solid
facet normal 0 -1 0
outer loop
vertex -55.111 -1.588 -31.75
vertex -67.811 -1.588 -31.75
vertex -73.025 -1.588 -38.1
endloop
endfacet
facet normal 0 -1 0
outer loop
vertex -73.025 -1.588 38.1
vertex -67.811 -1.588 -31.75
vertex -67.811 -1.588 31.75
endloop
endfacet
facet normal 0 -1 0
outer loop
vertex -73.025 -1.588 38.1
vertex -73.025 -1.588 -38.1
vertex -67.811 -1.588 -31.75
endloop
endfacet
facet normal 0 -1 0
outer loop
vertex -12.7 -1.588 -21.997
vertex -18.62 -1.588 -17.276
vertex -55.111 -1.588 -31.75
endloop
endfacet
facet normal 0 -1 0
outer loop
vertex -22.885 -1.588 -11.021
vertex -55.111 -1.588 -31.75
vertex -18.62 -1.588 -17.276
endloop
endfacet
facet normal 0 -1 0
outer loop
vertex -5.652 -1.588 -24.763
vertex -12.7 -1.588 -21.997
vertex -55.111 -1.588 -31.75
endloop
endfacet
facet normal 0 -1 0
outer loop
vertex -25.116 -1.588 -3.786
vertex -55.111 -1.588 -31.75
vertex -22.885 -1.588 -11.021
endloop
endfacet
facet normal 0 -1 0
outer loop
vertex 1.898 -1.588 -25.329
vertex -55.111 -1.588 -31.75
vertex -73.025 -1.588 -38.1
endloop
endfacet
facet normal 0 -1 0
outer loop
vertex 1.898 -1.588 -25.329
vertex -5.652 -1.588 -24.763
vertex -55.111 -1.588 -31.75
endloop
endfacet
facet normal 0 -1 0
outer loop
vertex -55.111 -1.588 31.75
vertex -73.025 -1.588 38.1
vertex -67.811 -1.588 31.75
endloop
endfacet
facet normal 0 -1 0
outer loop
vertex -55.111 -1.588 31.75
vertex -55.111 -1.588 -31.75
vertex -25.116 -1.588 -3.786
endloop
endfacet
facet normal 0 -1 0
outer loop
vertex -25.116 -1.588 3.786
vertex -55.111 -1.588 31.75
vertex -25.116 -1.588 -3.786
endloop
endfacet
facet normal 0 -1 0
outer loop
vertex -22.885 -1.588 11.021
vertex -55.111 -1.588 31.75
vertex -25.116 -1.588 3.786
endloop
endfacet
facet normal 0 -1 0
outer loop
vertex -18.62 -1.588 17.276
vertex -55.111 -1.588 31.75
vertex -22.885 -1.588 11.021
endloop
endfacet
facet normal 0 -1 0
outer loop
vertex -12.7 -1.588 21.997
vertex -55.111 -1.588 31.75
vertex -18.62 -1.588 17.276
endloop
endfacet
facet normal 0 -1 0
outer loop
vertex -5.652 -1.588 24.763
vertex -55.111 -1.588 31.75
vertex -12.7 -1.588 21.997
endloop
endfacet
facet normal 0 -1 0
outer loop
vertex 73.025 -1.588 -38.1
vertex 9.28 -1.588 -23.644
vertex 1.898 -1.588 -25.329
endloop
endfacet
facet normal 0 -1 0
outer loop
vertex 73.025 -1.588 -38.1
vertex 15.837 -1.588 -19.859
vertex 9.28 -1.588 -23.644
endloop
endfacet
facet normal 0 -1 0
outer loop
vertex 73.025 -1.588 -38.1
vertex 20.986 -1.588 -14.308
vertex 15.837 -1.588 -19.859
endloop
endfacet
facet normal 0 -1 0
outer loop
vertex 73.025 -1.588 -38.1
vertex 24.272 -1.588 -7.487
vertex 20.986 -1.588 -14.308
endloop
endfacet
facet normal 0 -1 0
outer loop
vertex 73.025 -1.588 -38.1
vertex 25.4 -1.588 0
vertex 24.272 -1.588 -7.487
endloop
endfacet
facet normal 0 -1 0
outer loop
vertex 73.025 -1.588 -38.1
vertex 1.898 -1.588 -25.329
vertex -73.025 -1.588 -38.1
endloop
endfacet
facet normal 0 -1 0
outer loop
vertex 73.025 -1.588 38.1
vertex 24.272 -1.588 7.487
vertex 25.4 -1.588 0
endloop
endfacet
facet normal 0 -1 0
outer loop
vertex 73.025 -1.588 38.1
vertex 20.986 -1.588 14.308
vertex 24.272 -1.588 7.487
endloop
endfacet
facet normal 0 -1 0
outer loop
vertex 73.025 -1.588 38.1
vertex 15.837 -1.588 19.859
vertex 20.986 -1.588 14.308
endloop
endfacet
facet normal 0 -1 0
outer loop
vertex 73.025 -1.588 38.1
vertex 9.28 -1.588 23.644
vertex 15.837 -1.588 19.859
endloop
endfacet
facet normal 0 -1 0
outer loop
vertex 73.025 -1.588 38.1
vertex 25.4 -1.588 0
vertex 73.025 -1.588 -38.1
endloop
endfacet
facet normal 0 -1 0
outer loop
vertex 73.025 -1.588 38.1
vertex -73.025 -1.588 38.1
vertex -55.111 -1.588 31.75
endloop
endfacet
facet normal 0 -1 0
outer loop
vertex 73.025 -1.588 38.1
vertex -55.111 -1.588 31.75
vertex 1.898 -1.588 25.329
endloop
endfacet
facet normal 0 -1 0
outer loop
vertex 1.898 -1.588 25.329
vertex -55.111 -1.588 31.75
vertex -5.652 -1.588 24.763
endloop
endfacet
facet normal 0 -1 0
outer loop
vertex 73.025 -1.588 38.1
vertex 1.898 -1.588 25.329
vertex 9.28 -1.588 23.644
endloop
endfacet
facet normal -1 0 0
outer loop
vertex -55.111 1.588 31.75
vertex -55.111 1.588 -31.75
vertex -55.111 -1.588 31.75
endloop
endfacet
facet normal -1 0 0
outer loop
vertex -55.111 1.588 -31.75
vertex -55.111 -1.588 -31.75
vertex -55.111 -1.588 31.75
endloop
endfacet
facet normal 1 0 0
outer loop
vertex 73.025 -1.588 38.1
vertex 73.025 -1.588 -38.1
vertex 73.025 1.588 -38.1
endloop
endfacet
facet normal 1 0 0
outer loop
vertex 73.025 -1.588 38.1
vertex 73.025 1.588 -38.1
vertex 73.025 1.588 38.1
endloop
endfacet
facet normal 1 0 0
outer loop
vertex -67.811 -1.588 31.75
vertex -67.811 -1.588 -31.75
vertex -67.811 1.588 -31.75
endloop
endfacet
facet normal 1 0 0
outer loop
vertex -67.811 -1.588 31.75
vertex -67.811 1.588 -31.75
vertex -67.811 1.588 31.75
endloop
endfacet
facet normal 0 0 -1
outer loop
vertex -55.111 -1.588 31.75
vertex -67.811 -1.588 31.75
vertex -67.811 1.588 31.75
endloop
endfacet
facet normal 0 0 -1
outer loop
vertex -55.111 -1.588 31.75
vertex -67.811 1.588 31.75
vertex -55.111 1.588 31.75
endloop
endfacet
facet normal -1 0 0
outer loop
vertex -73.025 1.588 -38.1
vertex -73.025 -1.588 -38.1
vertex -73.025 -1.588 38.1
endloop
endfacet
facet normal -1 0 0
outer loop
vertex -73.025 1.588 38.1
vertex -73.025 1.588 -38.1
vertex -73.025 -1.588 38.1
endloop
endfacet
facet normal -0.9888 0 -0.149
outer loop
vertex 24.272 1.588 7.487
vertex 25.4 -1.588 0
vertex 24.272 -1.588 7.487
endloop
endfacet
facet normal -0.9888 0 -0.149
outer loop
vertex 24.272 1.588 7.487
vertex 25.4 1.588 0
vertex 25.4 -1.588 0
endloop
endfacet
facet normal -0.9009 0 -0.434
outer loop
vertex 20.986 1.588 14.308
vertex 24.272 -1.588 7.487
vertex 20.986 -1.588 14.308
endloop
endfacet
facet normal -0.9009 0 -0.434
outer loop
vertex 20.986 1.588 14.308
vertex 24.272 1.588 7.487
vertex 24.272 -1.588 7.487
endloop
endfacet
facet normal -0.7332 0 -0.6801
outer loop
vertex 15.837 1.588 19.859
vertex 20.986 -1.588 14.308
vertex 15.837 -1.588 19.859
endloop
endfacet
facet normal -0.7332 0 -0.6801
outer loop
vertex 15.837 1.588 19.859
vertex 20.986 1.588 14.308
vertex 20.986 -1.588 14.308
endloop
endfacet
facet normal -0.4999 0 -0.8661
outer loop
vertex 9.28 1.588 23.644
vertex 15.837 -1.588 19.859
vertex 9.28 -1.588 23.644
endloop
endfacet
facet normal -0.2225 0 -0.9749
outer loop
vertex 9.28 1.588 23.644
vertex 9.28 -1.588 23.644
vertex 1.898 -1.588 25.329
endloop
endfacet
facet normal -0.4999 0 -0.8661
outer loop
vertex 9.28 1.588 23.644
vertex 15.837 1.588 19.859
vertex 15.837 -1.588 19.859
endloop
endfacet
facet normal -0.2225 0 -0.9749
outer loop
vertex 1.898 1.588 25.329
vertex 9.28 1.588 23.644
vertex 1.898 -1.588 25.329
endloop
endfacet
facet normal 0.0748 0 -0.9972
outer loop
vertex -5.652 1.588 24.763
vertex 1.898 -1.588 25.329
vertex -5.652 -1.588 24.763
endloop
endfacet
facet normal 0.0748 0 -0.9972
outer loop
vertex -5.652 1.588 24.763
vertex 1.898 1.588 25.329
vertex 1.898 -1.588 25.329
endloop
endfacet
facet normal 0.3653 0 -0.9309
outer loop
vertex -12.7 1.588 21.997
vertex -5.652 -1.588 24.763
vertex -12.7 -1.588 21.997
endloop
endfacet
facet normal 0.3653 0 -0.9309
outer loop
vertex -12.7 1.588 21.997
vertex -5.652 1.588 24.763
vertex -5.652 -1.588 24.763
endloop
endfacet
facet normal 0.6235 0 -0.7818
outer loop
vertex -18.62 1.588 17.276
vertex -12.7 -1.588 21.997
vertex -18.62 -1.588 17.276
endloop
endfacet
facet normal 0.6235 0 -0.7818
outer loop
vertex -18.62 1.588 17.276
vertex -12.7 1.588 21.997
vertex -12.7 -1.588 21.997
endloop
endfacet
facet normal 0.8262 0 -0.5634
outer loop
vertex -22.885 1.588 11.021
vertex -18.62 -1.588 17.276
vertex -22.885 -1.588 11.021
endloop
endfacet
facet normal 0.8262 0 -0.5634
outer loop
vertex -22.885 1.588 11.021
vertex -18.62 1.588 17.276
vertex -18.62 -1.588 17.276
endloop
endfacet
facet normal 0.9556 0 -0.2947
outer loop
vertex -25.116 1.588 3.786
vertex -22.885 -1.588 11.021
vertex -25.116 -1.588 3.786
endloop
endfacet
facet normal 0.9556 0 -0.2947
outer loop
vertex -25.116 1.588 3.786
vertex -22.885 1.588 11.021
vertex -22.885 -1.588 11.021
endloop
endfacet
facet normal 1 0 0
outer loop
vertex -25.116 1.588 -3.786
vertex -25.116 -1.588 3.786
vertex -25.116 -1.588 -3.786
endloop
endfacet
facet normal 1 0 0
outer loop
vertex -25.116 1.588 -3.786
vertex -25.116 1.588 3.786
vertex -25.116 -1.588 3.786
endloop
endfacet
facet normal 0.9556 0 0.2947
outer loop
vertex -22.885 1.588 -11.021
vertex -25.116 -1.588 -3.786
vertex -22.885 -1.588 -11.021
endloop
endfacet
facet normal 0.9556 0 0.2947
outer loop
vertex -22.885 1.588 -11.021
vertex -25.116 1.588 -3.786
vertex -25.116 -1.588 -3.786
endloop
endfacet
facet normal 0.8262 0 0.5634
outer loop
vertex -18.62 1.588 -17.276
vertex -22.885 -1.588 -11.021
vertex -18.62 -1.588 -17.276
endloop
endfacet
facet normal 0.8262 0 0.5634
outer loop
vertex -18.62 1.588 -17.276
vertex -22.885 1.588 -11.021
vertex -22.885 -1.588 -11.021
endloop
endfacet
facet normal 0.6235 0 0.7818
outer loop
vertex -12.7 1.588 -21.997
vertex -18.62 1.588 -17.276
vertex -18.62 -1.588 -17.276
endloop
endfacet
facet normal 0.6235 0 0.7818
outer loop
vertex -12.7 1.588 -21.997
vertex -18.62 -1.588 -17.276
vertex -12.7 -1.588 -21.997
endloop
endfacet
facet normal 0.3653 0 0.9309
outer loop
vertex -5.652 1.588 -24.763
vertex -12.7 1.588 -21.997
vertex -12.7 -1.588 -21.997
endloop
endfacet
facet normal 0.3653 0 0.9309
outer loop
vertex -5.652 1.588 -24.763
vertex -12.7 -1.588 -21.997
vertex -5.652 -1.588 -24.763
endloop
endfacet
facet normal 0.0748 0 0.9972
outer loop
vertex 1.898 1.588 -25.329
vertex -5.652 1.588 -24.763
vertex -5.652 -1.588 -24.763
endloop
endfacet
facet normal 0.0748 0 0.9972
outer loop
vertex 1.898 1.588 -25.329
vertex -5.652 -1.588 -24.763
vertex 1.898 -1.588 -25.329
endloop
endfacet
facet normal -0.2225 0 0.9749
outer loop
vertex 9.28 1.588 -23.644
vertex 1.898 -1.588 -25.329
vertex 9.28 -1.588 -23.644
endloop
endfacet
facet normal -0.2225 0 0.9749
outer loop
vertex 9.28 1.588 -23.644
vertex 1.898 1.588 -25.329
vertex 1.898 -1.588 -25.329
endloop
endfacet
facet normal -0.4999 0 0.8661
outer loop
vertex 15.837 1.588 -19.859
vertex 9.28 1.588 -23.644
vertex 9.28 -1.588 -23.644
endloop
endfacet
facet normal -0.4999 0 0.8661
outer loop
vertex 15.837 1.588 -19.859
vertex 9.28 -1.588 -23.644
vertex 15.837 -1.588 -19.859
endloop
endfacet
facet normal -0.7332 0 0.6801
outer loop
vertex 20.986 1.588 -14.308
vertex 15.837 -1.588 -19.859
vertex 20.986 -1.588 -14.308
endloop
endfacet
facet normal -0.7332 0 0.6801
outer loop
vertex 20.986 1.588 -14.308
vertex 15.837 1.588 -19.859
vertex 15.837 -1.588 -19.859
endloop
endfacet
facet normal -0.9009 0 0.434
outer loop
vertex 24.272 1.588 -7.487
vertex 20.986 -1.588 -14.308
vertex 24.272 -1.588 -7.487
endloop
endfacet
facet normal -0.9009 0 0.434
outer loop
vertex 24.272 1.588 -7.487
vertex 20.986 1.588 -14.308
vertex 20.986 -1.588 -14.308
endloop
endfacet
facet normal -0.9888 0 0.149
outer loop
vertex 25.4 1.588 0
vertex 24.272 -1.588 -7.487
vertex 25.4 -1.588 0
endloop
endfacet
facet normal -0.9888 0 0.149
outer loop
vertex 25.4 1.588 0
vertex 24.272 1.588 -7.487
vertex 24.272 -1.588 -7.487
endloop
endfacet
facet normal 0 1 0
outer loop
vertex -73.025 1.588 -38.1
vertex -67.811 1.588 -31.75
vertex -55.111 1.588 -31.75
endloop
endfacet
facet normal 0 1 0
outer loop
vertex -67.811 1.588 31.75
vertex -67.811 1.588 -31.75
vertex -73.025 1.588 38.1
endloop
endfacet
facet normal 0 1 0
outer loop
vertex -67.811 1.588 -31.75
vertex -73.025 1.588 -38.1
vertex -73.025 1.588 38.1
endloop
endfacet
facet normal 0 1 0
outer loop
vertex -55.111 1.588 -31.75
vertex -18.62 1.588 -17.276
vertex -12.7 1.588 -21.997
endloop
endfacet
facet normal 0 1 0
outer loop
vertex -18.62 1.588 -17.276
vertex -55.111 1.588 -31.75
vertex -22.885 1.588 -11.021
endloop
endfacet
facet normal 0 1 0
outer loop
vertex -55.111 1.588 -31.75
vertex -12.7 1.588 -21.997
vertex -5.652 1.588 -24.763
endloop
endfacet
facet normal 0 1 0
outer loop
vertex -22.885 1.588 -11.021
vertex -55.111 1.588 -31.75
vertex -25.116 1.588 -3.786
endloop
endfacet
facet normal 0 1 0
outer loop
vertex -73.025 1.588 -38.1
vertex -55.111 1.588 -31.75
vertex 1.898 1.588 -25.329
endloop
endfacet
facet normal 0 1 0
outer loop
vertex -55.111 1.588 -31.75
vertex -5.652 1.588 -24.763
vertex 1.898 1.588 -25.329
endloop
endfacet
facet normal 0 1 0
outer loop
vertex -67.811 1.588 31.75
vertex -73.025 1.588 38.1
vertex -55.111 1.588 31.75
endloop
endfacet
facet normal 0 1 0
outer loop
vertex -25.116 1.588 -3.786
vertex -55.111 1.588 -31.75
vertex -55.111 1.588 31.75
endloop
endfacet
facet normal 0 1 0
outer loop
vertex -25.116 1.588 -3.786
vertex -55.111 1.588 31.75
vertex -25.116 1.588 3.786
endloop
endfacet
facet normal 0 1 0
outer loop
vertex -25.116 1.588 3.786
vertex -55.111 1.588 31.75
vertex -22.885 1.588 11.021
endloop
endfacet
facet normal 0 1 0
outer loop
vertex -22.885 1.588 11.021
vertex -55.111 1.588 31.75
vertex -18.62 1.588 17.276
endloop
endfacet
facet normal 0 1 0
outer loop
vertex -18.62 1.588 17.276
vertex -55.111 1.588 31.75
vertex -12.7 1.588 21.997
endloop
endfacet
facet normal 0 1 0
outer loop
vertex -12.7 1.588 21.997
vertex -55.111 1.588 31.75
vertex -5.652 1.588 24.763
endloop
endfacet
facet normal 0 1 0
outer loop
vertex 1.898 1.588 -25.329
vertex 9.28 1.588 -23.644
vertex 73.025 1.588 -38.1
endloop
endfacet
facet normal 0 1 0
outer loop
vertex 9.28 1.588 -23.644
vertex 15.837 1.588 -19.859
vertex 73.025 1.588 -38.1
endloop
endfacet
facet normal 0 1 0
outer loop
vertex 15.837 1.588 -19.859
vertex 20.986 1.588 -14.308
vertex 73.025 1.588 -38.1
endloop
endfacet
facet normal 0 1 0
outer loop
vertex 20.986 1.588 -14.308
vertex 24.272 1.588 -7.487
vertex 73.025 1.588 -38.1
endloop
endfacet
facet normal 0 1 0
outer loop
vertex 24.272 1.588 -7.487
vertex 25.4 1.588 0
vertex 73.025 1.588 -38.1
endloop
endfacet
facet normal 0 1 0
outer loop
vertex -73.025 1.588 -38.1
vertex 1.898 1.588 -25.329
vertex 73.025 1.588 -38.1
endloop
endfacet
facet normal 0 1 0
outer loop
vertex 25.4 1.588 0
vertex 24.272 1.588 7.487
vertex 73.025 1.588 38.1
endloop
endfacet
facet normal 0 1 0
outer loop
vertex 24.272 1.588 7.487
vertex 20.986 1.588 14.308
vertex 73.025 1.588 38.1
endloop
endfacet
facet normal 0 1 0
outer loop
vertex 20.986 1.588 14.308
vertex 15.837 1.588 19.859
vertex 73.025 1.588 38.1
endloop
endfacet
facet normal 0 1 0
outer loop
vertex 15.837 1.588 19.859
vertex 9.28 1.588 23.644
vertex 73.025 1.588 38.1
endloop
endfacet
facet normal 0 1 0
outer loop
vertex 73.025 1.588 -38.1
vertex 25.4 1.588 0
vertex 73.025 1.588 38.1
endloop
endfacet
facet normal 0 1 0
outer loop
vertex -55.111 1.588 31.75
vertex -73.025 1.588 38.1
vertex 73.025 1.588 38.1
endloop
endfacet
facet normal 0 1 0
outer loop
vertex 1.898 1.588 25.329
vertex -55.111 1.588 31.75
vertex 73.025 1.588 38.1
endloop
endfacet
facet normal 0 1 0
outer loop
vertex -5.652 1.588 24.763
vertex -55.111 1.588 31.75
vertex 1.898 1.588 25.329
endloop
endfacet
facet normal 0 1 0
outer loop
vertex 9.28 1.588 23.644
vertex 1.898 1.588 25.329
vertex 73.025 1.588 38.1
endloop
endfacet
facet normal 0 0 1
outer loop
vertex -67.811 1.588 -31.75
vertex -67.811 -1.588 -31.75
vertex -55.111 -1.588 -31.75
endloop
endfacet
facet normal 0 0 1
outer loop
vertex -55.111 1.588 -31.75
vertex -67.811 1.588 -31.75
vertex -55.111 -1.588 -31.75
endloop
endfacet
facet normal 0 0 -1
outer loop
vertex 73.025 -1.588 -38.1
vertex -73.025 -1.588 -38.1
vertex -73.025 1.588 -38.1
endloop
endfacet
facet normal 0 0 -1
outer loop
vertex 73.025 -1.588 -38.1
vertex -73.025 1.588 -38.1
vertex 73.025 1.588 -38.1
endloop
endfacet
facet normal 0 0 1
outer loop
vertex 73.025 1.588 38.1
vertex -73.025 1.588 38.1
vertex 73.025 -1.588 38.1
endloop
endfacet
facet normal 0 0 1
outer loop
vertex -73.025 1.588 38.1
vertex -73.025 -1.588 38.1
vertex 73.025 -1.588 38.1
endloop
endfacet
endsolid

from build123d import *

# Parameters (mm, degrees)
F0_W     = 146.05
F0_H     = 76.2
F0_W_2   = 12.7
F0_H_2   = 63.5
F0_R     = 25.4
F1_DEPTH = 1.5875


with BuildPart() as f1:
    # F0 (on Front) → F1 (new body, symmetric)
    with BuildSketch(Plane.XZ):
        Rectangle(F0_W, F0_H)
        with Locations((-61.460756, 0)):
            Rectangle(F0_W_2, F0_H_2, mode=Mode.SUBTRACT)
        Circle(F0_R, mode=Mode.SUBTRACT)
    extrude(amount=F1_DEPTH, both=True)


solid = f1.part
